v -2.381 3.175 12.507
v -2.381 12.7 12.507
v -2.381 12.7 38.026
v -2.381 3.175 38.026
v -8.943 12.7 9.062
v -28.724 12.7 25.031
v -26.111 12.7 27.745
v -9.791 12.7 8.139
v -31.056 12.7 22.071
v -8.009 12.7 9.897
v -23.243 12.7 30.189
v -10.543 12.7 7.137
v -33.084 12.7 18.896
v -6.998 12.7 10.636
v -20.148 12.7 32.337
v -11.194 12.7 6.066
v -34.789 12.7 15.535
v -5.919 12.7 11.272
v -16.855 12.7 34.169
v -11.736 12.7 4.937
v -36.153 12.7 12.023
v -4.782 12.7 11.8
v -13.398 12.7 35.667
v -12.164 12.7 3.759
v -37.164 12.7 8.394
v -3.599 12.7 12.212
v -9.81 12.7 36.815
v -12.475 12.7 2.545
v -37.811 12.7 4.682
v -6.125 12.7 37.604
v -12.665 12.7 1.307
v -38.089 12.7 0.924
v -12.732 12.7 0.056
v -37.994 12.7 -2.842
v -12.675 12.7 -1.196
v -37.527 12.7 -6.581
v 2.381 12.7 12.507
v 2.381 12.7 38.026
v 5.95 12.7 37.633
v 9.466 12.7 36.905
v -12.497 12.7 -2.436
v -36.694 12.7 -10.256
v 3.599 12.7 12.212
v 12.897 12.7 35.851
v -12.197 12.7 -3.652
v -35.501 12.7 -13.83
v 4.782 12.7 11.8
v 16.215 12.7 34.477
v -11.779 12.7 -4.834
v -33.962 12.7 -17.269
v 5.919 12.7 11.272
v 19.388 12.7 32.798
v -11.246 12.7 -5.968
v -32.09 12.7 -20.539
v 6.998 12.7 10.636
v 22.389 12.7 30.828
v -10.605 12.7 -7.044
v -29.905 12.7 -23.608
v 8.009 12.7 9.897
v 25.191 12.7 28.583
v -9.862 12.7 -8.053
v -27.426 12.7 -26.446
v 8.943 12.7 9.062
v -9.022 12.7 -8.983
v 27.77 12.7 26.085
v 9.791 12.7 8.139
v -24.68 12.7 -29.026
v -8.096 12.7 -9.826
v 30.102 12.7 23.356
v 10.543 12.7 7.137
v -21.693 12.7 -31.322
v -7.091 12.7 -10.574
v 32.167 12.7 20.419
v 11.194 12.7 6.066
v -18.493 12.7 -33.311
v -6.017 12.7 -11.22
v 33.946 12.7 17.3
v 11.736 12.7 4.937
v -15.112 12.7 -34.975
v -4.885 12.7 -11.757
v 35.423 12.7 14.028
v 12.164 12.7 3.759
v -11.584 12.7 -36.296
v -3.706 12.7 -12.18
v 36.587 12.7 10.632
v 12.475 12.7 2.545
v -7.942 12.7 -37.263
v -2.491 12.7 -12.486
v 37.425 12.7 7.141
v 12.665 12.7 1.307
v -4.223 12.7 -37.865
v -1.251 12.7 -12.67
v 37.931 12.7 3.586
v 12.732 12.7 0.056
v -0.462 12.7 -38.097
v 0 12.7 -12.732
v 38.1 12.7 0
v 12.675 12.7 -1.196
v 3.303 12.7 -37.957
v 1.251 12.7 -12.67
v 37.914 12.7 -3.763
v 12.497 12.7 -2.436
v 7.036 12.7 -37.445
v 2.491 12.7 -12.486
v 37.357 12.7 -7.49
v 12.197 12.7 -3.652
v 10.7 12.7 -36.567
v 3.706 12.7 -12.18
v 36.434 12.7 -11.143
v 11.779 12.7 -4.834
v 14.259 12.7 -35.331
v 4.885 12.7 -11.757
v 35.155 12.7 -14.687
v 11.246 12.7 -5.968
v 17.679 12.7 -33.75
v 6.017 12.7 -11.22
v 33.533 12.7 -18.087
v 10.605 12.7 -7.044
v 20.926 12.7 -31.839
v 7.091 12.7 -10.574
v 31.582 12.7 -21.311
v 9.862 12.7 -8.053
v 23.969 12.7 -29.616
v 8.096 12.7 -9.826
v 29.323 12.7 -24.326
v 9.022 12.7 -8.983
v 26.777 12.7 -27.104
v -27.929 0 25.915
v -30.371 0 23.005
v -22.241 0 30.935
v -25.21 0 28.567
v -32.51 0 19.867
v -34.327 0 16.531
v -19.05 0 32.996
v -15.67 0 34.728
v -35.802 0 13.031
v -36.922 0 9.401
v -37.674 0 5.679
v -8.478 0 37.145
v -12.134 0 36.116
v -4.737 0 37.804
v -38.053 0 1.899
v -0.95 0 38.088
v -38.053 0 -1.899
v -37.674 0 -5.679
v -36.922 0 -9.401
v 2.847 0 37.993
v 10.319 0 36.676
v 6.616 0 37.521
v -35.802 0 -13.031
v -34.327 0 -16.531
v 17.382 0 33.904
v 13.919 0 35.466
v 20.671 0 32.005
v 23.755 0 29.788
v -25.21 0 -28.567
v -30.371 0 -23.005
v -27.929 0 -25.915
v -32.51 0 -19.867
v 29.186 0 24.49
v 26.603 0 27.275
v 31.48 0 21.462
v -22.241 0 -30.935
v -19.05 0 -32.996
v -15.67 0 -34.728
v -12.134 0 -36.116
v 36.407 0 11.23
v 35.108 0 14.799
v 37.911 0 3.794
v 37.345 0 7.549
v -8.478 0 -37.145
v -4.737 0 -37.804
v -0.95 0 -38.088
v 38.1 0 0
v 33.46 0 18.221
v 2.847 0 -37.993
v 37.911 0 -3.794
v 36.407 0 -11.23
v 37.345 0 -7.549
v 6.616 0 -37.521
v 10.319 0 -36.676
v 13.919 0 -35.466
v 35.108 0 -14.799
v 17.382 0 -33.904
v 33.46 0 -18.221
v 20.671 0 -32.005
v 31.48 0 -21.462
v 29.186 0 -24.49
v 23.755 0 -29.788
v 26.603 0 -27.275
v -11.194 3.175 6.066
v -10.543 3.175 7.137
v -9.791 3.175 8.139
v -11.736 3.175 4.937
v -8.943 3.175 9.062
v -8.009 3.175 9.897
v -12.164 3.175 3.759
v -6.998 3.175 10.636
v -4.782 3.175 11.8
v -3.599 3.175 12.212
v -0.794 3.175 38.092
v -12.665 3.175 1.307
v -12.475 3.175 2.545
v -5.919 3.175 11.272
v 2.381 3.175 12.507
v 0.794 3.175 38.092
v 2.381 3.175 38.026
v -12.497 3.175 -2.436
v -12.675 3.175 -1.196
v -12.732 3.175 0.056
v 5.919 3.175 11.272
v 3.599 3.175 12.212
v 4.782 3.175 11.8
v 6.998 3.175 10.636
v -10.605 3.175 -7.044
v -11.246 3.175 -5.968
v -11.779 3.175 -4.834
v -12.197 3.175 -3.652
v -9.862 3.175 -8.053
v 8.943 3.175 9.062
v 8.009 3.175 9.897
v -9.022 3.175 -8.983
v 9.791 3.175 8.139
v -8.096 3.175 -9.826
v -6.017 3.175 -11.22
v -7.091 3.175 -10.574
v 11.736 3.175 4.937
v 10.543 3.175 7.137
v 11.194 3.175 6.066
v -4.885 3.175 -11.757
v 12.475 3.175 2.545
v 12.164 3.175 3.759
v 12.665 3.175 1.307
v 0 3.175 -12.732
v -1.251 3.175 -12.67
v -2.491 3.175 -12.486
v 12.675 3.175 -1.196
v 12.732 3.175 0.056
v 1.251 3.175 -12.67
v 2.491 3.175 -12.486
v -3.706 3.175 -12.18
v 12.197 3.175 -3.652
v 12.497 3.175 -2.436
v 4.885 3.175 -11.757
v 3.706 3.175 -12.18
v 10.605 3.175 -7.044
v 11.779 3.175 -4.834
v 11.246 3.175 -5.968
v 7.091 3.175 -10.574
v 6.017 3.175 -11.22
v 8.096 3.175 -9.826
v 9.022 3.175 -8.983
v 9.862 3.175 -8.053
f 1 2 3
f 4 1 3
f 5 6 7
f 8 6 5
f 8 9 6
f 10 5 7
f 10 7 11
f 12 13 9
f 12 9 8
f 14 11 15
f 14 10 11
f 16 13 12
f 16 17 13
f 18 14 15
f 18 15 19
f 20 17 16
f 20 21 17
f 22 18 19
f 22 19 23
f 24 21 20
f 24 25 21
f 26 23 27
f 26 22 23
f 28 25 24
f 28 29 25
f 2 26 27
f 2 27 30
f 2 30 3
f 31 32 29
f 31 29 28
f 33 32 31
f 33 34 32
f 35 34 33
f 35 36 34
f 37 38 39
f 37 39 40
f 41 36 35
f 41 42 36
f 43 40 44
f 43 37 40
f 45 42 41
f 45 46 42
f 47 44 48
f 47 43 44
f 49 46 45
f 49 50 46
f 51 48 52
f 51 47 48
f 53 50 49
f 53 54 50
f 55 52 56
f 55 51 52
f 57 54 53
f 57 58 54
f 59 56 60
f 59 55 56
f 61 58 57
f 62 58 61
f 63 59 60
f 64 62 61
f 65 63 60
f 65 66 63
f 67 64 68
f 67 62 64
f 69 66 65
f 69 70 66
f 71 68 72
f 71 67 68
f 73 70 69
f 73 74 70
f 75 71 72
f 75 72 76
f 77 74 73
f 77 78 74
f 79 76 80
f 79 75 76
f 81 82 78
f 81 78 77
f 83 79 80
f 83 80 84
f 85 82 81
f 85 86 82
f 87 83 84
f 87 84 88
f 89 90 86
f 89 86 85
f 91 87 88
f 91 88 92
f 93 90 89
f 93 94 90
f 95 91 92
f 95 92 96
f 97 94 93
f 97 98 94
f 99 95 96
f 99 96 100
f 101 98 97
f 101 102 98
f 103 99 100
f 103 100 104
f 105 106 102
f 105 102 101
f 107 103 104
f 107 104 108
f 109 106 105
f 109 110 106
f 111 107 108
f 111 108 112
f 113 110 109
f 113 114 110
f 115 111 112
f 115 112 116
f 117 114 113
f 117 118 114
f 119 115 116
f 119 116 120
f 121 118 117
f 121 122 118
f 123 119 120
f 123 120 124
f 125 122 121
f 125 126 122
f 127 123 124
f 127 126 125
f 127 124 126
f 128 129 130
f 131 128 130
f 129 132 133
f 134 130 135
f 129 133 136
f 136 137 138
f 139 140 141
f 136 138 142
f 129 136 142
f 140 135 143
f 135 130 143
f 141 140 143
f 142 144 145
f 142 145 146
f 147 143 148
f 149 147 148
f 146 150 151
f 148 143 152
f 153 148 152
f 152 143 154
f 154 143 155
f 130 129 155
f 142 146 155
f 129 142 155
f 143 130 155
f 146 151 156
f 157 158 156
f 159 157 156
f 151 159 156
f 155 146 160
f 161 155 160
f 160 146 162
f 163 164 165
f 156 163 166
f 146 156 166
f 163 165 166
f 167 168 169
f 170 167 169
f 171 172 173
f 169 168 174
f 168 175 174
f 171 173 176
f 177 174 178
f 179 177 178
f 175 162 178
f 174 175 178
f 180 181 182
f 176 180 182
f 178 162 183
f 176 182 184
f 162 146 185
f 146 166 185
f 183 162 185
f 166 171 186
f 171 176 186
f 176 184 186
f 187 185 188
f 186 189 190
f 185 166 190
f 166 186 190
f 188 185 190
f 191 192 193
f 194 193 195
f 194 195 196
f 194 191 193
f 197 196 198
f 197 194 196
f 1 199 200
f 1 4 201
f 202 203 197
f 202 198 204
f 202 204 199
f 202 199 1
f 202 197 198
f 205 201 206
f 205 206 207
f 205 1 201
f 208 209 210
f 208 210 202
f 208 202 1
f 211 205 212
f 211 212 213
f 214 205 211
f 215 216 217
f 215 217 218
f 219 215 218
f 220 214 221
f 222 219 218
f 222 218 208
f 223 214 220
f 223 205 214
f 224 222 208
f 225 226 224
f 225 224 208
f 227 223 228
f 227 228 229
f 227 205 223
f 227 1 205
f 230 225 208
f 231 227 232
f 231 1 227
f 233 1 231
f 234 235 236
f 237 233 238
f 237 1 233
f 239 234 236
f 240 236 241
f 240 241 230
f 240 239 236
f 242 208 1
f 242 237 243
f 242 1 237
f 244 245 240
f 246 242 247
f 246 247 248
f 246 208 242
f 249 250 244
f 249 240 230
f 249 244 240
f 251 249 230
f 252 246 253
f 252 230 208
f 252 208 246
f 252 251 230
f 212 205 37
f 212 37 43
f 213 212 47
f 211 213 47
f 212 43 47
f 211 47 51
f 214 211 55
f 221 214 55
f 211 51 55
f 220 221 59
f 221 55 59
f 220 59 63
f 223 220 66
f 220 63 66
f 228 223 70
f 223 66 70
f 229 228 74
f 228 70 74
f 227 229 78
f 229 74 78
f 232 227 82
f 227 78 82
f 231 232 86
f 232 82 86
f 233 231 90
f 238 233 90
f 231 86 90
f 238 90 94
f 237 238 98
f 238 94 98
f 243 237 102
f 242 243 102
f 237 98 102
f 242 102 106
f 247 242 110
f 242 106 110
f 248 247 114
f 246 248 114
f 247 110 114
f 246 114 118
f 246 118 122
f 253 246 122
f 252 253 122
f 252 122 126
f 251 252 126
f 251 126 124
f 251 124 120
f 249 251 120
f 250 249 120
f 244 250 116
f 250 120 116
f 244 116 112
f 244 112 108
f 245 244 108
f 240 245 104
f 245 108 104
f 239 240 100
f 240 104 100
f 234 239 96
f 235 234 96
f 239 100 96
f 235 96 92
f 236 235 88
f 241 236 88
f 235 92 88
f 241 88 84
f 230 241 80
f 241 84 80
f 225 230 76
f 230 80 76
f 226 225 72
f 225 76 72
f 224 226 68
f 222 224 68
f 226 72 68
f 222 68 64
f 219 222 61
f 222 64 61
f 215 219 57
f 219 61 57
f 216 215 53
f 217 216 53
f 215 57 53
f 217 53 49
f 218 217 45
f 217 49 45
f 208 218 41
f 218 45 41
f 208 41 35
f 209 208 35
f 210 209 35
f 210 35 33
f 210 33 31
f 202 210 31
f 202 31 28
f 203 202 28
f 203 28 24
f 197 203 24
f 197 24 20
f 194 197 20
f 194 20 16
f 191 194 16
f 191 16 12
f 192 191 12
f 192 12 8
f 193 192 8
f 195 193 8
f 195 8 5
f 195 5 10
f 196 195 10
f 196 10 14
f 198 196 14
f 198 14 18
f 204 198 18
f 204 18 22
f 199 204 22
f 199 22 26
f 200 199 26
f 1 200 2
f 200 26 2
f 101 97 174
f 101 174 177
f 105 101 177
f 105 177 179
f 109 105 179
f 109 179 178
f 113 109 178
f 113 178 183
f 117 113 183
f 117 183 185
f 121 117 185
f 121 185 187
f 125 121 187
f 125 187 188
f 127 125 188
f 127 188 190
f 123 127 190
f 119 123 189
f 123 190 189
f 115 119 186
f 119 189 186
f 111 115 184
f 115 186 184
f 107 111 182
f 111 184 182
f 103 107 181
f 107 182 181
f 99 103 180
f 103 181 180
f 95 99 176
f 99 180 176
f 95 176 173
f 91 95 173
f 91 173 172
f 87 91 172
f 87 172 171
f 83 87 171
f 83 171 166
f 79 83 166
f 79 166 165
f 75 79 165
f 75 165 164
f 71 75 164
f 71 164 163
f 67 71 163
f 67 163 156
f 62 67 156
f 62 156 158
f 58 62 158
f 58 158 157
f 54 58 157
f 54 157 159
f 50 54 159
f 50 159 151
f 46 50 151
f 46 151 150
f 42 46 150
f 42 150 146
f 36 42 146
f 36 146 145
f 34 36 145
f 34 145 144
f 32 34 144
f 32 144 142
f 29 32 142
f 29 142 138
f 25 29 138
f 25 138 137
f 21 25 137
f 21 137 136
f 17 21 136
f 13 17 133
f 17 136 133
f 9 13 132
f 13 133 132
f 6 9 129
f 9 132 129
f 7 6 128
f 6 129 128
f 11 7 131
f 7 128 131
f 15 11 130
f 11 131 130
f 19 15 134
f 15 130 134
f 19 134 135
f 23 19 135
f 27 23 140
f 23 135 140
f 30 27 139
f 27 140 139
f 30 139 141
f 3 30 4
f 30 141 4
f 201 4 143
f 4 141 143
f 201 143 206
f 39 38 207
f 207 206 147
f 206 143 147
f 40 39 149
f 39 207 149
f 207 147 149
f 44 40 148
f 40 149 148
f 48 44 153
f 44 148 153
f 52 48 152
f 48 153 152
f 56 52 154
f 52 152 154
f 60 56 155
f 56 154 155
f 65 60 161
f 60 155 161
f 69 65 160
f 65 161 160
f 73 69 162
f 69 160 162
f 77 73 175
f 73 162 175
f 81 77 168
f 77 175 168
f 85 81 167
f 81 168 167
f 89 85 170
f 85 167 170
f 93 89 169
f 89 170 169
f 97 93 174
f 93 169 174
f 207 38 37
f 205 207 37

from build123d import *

# Parameters (mm, degrees)
SKETCH1_R           = 38.1
BOSS_EXTRUDE1_DEPTH = 12.7
CUT_EXTRUDE1_DEPTH  = 9.525


with BuildPart() as part:
    # Sketch1 → Boss-Extrude1 (new body)
    with BuildSketch(Plane(origin=(0, 0, 0), x_dir=(1, 0, 0), z_dir=(0, 1, 0))):
        Circle(SKETCH1_R)
    extrude(amount=BOSS_EXTRUDE1_DEPTH)

    # Sketch2 → Cut-Extrude1 (cut)
    with BuildSketch(Plane(origin=(0, 12.7, 0), x_dir=(1, 0, 0), z_dir=(0, 1, 0))):
        with BuildLine():
            Line((2.38125, -38.025513125), (2.38125, -12.507082254))
            ThreePointArc((2.38125, -12.507082254), (0, 12.73175), (-2.38125, -12.507082254))
            Line((-2.38125, -12.507082254), (-2.38125, -38.025513125))
            ThreePointArc((-2.38125, -38.025513125), (0, -38.1), (2.38125, -38.025513125))
        make_face()
    extrude(amount=-CUT_EXTRUDE1_DEPTH, mode=Mode.SUBTRACT)


solid = part.part
